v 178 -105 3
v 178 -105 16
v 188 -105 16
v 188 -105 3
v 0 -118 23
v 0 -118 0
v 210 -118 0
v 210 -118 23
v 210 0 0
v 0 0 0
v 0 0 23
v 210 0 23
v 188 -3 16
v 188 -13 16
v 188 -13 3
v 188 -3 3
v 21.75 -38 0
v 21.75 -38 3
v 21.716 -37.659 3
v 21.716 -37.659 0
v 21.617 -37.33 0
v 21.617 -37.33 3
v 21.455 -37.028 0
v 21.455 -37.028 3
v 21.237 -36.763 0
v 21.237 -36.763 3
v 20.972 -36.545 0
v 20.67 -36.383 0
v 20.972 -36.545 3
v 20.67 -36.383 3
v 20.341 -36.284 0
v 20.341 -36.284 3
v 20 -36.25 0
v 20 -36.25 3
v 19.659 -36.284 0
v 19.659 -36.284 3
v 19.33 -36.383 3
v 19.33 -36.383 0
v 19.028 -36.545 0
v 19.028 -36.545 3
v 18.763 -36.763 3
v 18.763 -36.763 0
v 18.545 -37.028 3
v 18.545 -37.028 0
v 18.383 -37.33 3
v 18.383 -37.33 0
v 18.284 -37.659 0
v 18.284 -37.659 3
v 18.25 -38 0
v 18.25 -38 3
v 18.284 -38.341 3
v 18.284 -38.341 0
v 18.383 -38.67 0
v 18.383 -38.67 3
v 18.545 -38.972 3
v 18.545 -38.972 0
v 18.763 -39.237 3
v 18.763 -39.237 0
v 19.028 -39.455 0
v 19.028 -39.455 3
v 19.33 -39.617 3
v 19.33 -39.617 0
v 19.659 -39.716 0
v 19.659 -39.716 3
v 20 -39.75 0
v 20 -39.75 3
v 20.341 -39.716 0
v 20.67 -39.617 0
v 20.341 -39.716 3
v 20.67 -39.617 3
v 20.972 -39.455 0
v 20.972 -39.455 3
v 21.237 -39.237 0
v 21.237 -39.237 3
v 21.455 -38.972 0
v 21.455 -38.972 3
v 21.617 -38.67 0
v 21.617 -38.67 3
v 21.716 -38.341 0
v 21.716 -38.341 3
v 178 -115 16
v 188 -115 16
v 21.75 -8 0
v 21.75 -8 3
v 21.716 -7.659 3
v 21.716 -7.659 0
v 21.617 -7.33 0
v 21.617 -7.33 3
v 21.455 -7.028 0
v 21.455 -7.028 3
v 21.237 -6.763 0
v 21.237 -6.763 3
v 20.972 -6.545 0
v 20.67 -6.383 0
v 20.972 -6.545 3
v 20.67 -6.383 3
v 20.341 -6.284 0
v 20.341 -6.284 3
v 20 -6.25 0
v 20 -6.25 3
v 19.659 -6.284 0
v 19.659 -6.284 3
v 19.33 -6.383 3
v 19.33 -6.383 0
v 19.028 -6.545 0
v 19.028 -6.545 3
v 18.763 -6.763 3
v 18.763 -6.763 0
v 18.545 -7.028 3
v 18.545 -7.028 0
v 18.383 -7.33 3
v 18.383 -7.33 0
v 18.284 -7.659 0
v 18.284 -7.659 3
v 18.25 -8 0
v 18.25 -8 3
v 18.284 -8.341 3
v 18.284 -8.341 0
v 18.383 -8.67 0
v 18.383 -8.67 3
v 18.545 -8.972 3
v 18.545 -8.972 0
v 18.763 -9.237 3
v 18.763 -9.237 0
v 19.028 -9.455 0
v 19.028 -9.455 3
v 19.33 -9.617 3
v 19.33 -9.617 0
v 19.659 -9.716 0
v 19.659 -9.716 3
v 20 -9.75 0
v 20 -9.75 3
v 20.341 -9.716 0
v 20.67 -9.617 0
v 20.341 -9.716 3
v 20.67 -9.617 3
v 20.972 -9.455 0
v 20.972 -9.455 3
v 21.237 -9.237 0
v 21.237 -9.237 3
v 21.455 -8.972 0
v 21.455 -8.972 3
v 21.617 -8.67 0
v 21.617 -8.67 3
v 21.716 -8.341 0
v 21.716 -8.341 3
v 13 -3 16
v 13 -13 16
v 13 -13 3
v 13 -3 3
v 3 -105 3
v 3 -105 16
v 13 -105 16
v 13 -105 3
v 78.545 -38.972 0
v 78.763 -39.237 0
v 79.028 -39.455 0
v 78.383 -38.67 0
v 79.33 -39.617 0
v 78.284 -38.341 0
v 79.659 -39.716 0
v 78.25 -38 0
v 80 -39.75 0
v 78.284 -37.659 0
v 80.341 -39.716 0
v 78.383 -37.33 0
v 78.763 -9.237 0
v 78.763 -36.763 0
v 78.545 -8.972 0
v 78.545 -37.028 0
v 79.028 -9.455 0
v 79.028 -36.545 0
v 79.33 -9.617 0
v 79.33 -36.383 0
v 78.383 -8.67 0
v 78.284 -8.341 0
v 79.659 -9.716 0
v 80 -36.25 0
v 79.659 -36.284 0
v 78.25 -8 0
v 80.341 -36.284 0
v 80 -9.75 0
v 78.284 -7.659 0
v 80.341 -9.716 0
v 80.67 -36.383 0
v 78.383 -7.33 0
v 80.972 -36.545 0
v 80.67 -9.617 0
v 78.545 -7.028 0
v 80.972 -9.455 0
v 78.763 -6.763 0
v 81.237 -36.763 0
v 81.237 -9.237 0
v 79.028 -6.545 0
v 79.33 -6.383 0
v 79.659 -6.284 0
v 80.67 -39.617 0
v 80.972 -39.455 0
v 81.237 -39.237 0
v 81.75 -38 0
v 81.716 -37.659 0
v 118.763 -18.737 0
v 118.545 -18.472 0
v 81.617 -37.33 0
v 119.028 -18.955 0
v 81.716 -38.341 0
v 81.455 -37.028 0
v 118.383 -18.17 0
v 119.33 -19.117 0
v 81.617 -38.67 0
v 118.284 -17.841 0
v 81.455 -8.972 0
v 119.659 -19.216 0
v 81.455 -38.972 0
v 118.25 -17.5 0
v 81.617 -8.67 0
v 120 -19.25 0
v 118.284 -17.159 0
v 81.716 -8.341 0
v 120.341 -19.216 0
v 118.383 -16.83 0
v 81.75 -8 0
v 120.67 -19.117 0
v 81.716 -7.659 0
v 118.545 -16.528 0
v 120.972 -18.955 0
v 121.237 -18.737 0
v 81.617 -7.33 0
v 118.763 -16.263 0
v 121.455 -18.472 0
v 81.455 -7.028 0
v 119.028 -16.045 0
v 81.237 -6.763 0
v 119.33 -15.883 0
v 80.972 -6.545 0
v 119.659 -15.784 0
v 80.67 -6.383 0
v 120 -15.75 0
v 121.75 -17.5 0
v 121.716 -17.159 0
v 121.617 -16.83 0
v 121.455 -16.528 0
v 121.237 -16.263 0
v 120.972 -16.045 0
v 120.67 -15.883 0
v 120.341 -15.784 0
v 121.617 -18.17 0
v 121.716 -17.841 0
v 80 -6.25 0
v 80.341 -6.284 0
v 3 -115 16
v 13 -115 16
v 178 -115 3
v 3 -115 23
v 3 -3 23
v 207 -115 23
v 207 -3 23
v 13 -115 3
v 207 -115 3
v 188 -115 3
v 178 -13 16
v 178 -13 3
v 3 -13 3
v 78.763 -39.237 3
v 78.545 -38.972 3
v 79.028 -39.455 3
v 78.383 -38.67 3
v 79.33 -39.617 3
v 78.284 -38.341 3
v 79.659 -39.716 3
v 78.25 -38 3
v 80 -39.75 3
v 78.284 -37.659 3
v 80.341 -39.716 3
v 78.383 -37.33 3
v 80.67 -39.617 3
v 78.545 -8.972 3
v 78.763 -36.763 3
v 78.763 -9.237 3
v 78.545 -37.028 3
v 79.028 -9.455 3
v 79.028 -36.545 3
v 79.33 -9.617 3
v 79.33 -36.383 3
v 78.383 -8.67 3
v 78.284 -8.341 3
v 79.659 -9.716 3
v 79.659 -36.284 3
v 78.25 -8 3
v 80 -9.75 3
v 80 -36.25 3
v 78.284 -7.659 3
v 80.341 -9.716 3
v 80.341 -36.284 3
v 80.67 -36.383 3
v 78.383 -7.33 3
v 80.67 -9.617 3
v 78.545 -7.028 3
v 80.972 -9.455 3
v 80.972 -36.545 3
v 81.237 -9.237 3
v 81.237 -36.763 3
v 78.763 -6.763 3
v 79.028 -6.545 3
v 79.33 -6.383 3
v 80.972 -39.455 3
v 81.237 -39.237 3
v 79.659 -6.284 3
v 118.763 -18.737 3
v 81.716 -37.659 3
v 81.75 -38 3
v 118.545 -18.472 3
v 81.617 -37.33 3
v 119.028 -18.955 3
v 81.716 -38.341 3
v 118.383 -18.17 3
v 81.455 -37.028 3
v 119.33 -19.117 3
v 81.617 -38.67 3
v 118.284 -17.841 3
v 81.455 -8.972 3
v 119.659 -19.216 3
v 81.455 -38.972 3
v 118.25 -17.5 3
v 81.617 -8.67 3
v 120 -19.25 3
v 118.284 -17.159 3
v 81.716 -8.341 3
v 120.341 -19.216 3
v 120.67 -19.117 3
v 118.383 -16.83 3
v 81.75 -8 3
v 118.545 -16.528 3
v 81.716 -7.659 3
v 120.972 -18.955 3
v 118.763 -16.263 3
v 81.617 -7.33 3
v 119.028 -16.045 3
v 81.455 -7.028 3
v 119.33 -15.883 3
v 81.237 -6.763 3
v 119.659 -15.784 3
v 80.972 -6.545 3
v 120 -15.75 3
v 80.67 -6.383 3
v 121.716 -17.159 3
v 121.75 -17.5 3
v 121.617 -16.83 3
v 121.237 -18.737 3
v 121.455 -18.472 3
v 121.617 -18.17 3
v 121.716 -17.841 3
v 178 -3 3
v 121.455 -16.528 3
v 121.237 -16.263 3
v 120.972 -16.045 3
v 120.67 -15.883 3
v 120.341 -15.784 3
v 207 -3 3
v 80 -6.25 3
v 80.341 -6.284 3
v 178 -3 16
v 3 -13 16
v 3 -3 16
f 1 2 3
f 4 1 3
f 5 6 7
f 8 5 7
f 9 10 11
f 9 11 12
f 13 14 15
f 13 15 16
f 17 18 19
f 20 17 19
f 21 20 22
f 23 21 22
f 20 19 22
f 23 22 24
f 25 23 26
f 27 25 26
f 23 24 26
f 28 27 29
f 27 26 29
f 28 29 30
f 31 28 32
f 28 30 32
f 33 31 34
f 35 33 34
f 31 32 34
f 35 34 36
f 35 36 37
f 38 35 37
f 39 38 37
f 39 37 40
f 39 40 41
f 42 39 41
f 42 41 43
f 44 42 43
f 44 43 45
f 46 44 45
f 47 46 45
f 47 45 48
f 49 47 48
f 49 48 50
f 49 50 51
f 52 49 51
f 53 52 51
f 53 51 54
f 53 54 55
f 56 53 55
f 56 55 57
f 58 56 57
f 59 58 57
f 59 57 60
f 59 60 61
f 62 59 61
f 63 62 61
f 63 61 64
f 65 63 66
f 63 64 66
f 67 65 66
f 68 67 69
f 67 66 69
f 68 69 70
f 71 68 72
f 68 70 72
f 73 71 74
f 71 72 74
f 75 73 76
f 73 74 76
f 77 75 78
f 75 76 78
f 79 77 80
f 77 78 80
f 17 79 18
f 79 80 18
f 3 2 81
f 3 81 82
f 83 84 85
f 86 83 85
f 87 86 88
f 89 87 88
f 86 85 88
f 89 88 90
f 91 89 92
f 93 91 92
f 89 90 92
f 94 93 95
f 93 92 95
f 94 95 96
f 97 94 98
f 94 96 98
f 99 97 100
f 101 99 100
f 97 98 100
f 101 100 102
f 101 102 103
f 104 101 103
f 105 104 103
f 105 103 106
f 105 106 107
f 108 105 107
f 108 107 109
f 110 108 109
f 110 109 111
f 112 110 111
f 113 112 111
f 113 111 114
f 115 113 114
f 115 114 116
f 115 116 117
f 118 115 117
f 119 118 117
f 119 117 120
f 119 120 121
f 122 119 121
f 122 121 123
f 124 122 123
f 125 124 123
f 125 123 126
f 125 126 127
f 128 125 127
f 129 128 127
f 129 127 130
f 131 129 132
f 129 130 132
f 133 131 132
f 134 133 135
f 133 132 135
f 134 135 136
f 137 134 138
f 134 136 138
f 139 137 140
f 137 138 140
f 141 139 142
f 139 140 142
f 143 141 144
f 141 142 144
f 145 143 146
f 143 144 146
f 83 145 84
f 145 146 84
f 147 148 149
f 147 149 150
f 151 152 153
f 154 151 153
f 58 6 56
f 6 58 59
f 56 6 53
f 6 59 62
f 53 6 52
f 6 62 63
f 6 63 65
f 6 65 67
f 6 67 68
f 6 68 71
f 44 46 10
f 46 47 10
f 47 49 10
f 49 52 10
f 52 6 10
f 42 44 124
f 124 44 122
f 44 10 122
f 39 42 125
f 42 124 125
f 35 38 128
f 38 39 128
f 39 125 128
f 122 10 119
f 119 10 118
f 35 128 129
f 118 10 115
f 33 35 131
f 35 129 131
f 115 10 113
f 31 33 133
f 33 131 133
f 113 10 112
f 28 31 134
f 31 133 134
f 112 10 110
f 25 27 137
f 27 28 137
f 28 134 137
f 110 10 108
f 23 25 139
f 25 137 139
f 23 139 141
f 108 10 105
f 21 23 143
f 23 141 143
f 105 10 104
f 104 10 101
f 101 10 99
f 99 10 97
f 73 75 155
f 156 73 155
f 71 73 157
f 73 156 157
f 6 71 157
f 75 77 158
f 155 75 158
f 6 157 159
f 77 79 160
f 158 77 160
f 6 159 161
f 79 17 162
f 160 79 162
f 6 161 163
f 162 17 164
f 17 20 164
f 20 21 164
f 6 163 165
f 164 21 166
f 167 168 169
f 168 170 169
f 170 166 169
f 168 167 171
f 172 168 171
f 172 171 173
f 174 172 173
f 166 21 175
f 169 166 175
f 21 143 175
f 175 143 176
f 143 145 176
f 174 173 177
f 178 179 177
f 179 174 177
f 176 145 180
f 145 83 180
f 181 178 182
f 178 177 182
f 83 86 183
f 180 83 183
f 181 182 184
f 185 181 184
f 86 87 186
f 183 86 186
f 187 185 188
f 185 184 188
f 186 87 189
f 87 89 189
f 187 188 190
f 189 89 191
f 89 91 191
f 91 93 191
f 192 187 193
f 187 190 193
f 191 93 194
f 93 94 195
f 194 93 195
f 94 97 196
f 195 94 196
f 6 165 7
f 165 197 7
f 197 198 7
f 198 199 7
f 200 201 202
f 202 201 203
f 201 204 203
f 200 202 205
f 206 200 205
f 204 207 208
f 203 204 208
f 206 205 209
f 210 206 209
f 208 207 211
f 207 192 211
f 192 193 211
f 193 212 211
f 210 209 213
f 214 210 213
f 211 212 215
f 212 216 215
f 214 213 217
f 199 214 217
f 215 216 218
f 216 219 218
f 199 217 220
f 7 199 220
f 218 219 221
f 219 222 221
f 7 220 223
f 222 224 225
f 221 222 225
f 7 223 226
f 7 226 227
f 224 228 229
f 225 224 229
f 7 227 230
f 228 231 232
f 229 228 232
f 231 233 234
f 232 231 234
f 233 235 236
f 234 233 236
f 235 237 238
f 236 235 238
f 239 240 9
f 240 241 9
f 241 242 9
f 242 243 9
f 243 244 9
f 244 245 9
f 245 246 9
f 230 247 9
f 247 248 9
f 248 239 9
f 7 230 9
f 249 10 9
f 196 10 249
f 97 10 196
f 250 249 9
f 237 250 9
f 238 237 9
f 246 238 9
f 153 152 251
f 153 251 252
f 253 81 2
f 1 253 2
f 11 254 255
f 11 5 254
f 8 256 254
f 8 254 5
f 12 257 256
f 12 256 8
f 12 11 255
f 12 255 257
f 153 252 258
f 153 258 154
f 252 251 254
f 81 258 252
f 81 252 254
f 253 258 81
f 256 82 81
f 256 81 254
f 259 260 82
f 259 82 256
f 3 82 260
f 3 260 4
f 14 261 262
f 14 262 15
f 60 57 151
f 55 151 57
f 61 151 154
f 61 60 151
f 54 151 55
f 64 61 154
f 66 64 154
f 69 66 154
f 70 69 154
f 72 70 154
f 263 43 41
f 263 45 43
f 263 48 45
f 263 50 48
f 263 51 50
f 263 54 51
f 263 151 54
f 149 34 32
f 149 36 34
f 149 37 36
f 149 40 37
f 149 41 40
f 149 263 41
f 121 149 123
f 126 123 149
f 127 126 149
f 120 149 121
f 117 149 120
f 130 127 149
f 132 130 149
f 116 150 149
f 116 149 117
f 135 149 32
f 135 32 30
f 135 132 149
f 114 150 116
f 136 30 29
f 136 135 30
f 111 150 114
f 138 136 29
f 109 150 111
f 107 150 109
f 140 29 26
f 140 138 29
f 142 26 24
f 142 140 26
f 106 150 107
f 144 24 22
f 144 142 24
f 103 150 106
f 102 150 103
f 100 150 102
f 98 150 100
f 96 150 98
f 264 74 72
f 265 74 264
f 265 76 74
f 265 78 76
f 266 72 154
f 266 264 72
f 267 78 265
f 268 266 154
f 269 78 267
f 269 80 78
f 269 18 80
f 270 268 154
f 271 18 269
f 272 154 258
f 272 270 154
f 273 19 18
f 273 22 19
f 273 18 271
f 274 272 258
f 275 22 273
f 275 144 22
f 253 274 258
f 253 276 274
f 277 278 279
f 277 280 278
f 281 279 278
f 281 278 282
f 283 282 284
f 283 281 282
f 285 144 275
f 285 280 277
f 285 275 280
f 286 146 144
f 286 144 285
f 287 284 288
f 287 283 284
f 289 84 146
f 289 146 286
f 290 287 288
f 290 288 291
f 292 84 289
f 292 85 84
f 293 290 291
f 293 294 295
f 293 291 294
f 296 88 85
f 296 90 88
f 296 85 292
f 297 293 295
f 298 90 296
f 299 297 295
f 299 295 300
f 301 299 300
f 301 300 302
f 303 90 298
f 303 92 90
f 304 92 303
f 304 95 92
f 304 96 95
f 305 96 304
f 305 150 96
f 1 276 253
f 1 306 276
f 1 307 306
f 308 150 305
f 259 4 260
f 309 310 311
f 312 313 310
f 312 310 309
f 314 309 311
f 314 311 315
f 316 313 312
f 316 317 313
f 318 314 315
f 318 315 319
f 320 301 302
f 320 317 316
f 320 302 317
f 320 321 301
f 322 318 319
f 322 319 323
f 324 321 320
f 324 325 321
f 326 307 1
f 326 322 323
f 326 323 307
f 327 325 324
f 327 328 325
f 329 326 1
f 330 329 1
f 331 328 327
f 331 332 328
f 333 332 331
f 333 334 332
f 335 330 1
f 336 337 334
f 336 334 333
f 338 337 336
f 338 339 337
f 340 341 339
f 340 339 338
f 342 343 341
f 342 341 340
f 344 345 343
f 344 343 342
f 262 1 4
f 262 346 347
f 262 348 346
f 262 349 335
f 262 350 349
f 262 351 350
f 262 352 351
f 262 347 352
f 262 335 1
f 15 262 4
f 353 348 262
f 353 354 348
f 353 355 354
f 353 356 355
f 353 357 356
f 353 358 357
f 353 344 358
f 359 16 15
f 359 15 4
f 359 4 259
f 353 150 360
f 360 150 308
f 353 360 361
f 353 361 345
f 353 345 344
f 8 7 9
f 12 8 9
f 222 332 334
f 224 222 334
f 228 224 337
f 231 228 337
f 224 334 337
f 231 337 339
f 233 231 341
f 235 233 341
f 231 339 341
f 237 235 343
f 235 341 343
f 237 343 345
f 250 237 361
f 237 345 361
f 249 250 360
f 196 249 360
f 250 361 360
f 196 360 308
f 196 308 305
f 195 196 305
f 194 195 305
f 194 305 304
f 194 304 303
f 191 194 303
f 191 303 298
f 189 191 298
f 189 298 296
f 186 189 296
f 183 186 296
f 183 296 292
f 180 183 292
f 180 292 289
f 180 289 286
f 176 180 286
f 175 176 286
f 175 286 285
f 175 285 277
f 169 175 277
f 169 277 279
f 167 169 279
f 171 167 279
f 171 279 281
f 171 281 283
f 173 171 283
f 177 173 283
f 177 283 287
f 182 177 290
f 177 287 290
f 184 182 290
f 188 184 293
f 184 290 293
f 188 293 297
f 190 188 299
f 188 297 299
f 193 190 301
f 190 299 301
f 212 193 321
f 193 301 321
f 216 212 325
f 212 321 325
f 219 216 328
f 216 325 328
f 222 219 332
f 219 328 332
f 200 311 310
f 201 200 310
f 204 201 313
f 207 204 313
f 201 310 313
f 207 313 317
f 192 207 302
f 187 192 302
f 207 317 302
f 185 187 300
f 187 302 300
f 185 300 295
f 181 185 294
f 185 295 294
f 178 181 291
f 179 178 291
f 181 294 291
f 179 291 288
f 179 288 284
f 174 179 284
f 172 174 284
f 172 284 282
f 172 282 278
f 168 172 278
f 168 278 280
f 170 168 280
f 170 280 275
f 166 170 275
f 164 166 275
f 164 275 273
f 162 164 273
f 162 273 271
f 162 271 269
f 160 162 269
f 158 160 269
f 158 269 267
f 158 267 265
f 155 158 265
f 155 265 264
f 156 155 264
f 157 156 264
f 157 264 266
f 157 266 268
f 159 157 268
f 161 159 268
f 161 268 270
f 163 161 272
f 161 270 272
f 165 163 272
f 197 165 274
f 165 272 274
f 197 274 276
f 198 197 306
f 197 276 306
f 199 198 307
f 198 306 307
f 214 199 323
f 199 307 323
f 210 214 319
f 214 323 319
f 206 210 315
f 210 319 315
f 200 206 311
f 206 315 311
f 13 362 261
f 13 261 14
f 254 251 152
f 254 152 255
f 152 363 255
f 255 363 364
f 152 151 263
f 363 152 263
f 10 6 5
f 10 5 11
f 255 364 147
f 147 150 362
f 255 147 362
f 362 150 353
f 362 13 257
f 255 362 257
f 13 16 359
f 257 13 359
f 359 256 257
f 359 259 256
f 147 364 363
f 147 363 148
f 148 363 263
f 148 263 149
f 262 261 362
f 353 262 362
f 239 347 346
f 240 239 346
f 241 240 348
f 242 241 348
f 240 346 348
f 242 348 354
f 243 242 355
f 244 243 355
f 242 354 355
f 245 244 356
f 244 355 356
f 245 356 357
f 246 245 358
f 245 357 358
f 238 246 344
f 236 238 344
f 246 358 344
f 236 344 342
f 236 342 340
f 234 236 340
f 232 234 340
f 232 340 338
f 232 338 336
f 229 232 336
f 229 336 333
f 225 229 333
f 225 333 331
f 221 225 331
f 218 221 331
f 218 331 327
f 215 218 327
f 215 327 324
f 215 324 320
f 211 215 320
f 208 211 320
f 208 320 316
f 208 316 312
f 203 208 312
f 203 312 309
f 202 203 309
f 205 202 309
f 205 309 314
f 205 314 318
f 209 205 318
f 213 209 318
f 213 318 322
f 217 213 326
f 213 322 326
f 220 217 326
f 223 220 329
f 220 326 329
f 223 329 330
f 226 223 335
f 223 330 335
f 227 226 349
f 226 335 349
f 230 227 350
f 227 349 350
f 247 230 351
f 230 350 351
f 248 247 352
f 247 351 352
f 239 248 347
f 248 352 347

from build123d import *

# Parameters (mm, degrees)
F0_W     = 210
F0_H     = 118
F1_DEPTH = 23
F2_T     = -3
F3_W     = 10
F3_H     = 10
F4_DEPTH = 13
F5_R     = 1.75
F6_DEPTH = 25


with BuildPart() as f1:
    # F0 (on Top) → F1 (new body)
    with BuildSketch(Plane.XY):
        with Locations((105, -59)):
            Rectangle(F0_W, F0_H)
    extrude(amount=F1_DEPTH)

    # F2
    f2_openings = [f1.faces().sort_by_distance(p)[0] for p in [
        (105, -59, 23),
    ]]
    offset(amount=F2_T, openings=f2_openings)

    # F3 (on face) → F4 (join)
    with BuildSketch(Plane.XY.offset(3)):
        with Locations((8, -8)):
            Rectangle(F3_W, F3_H)
        with Locations((183, -8)):
            Rectangle(F3_W, F3_H)
        with Locations((183, -110)):
            Rectangle(F3_W, F3_H)
        with Locations((8, -110)):
            Rectangle(F3_W, F3_H)
    extrude(amount=F4_DEPTH)

    # F5 (on face) → F6 (cut)
    with BuildSketch(Plane.XY.offset(3)):
        with Locations((20, -8)):
            Circle(F5_R)
        with Locations((20, -38)):
            Circle(F5_R)
        with Locations((80, -38)):
            Circle(F5_R)
        with Locations((80, -8)):
            Circle(F5_R)
        with Locations((120, -17.5)):
            Circle(F5_R)
    extrude(amount=-F6_DEPTH, mode=Mode.SUBTRACT)


solid = f1.part
